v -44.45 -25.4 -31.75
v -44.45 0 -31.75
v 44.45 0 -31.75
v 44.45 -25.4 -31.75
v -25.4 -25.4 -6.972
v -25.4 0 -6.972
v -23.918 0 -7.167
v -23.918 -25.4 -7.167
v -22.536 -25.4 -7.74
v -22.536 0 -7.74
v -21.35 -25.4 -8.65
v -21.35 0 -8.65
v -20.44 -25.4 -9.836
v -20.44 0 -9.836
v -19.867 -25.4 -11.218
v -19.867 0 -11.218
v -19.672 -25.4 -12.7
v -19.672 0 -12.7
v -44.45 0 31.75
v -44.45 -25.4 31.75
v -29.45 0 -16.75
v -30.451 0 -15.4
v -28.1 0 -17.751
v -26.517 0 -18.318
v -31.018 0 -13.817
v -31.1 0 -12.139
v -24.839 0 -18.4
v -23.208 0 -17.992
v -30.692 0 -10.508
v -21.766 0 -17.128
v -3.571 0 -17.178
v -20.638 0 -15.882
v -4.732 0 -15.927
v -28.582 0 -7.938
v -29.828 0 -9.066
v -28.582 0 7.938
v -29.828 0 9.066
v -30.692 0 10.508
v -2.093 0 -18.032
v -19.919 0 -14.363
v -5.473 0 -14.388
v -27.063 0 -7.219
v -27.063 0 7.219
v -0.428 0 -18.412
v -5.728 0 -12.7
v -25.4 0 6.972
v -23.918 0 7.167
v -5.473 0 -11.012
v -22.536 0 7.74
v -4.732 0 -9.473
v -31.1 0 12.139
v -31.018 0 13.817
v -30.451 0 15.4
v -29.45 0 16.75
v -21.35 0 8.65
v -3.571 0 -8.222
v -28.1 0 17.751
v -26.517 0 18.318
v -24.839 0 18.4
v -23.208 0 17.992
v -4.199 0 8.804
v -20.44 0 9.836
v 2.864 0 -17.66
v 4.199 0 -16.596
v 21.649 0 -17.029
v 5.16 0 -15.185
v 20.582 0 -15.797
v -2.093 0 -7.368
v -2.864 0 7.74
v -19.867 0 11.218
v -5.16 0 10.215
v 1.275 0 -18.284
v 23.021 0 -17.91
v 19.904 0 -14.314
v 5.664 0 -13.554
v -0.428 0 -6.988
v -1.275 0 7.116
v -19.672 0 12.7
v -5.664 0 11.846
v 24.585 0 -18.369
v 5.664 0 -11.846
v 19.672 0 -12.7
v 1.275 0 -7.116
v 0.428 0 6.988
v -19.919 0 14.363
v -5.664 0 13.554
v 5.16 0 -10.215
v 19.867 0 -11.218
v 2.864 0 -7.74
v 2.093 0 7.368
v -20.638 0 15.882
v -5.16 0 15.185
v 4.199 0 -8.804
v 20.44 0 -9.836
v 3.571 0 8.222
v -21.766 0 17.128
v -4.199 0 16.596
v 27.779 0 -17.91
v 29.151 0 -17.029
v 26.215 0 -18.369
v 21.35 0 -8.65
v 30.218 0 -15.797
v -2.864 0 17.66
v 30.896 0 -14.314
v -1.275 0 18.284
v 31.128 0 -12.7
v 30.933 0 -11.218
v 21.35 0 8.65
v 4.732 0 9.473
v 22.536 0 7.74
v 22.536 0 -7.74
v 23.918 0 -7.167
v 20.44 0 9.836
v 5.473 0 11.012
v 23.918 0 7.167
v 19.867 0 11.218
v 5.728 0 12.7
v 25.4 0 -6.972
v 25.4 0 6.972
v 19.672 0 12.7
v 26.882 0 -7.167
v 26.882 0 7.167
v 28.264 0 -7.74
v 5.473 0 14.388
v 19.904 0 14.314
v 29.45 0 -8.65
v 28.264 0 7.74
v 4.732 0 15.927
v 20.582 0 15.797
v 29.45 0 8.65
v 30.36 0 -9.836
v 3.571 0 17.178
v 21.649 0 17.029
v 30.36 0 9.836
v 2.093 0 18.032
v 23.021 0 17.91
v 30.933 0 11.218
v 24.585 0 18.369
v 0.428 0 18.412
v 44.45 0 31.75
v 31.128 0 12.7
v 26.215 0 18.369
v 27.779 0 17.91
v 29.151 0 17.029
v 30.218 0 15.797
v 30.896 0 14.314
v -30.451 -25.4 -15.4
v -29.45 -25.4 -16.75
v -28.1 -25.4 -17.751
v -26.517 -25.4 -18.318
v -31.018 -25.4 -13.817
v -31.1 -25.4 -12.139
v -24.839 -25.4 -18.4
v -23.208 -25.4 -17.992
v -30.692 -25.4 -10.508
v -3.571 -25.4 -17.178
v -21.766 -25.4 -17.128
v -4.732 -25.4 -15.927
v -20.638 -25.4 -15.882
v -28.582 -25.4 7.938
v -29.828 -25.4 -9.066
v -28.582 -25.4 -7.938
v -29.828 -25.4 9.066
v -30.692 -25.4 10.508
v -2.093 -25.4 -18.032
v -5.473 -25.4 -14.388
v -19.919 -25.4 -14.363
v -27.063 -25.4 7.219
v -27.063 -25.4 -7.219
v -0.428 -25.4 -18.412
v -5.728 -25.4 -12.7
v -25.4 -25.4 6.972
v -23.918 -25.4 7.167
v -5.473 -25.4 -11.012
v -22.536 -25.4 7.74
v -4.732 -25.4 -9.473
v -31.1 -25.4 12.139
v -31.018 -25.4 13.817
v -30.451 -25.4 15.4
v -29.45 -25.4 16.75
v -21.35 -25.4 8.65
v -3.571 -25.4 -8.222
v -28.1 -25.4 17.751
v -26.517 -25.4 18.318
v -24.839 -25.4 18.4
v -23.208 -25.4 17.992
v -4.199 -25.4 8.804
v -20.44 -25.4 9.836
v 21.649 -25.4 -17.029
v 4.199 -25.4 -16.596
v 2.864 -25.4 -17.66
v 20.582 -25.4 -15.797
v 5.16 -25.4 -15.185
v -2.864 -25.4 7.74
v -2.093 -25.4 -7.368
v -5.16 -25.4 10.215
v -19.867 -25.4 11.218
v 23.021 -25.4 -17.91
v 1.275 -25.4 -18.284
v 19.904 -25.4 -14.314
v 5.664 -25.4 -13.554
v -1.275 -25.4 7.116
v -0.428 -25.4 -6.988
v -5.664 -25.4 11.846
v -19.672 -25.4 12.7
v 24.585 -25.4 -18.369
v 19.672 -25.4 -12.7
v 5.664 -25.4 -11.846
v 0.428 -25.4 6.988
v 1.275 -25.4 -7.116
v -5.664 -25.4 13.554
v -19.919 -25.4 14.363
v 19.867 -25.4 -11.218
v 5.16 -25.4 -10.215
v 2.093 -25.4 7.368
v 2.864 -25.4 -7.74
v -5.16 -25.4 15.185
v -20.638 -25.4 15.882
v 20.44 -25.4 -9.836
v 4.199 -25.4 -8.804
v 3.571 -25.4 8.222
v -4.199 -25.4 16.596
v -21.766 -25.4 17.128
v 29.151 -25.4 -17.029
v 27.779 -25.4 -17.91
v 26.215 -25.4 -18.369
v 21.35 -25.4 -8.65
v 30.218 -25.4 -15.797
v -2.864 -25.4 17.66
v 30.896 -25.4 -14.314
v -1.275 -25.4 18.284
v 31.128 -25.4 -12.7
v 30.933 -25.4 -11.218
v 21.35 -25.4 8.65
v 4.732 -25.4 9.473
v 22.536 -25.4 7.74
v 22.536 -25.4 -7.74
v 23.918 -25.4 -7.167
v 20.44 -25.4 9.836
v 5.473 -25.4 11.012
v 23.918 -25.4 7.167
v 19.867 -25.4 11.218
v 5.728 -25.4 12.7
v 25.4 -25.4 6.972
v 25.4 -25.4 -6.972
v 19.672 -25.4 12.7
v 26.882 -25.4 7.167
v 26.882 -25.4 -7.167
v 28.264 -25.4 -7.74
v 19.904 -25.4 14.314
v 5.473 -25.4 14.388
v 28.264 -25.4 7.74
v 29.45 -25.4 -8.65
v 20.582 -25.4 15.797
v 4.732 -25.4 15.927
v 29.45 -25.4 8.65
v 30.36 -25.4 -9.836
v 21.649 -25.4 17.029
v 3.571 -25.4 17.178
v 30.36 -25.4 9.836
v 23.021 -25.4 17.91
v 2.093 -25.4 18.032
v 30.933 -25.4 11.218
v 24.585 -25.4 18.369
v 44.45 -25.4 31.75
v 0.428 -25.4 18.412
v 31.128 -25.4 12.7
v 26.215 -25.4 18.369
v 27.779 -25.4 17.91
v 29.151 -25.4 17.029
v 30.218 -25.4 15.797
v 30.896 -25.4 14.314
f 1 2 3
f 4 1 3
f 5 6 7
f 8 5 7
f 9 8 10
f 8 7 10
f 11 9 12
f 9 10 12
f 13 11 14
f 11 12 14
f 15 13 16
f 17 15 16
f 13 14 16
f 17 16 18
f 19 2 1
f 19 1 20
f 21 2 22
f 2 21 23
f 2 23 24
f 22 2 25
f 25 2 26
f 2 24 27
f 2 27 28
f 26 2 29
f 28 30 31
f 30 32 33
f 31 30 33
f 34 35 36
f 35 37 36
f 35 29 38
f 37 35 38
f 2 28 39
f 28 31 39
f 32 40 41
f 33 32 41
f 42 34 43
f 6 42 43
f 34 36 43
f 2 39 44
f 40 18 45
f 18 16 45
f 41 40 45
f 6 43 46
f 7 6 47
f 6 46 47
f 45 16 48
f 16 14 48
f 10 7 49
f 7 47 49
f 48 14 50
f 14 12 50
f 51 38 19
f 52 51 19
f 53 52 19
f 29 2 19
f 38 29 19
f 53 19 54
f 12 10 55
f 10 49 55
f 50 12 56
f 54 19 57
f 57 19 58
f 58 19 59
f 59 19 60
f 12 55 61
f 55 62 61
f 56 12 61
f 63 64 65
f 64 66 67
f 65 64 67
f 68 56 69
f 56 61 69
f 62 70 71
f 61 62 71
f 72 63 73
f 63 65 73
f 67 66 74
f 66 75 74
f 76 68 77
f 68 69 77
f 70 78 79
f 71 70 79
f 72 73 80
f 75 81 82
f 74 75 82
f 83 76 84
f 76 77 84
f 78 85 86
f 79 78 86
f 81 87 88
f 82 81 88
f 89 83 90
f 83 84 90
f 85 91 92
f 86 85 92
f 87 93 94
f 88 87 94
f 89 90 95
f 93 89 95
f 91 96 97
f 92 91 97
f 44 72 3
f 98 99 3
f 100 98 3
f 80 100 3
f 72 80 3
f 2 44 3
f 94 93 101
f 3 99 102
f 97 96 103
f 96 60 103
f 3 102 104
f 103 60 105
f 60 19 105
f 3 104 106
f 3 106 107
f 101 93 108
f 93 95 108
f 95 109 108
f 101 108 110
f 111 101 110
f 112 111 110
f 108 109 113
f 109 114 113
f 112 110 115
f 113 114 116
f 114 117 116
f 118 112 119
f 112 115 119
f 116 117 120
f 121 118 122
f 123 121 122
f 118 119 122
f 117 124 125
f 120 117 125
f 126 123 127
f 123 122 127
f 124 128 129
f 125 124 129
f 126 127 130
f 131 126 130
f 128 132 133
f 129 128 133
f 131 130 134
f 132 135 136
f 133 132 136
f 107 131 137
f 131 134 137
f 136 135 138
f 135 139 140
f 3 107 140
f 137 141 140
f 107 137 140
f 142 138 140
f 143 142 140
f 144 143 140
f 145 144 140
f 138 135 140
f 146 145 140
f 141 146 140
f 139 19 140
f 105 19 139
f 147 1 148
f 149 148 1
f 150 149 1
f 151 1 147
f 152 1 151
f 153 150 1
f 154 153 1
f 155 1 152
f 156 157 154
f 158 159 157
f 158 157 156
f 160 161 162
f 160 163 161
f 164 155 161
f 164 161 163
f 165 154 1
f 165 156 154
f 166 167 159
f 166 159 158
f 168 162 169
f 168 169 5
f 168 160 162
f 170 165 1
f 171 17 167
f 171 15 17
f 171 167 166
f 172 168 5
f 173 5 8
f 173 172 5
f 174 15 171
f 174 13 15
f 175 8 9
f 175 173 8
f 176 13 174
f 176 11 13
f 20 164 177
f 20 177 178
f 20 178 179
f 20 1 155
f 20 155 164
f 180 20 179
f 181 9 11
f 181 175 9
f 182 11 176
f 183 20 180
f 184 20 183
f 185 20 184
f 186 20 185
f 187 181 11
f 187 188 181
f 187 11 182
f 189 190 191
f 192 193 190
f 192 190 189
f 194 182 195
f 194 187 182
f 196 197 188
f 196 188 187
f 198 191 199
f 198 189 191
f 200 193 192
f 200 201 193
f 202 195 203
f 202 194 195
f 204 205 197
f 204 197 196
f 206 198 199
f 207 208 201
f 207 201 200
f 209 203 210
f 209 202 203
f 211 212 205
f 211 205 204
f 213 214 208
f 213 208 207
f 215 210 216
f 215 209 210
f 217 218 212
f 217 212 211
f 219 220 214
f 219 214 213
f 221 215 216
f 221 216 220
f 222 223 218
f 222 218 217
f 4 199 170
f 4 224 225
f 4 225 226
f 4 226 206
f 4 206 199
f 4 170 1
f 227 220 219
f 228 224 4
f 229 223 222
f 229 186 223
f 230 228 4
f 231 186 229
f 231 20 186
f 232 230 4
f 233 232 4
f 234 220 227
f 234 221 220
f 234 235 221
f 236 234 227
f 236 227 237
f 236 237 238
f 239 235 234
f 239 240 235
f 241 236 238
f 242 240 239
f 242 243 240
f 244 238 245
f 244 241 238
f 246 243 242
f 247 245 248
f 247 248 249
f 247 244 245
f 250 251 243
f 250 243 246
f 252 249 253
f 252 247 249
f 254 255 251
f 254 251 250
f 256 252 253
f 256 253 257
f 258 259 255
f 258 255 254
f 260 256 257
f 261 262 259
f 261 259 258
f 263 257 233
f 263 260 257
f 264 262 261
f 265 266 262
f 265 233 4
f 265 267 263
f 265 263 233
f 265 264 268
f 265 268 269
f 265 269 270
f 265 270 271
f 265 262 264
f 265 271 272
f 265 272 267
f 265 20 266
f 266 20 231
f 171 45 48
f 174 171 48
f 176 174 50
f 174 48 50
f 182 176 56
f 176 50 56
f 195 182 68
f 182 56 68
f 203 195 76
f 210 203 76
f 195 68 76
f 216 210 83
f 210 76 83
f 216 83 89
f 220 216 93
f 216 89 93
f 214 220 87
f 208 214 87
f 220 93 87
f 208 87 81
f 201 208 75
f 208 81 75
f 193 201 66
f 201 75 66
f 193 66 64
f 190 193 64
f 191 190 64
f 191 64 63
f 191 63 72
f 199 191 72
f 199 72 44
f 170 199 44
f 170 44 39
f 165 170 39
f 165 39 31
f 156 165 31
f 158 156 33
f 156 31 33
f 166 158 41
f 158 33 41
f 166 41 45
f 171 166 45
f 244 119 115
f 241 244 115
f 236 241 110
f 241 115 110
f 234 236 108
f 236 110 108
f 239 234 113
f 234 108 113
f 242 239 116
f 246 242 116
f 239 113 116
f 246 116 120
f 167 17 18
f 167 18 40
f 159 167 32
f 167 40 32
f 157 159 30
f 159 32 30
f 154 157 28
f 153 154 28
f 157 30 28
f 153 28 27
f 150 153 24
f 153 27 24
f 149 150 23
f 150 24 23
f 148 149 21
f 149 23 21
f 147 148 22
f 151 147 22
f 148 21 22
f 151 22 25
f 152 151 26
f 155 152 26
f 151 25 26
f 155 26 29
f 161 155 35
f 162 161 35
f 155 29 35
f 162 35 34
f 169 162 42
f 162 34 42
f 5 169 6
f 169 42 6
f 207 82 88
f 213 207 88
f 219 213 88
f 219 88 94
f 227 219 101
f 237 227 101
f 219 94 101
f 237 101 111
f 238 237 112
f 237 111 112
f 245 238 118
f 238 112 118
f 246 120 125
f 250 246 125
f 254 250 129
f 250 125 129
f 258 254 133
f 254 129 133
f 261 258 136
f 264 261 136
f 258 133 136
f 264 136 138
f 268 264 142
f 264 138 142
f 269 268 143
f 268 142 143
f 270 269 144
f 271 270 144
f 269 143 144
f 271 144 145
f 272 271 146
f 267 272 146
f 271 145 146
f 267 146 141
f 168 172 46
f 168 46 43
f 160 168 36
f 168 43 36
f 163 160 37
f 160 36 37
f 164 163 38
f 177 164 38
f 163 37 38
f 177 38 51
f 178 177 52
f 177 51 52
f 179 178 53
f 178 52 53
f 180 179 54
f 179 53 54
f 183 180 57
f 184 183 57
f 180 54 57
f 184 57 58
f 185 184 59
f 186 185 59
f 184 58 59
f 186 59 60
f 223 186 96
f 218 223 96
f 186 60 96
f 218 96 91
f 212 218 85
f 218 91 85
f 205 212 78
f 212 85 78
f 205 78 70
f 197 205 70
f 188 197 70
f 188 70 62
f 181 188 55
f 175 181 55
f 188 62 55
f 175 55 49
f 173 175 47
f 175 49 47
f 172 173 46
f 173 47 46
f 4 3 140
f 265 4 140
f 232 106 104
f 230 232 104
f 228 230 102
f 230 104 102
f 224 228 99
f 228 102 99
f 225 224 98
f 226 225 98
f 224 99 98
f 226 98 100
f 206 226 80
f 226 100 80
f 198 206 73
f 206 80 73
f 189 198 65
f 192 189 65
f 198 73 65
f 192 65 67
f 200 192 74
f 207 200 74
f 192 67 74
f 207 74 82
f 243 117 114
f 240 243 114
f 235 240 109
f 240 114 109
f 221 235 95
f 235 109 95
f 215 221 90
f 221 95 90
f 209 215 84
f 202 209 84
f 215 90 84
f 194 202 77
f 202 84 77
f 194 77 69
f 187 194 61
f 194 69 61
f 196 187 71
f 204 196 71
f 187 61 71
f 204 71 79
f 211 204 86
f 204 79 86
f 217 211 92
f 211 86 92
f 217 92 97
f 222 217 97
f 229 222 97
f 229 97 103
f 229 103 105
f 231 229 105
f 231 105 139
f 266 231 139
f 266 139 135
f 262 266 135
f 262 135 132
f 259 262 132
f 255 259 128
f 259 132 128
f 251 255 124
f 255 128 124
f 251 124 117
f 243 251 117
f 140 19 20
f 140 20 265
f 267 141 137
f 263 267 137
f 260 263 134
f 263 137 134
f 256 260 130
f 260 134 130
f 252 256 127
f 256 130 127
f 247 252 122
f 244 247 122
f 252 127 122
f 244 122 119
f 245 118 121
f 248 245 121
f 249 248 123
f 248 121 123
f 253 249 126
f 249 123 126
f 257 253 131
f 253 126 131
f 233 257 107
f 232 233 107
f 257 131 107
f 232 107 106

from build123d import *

# Parameters (mm, degrees)
F0_W     = 88.9
F0_H     = 63.5
F1_DEPTH = 25.4


with BuildPart() as f1:
    # F0 (on Front) → F1 (new body)
    with BuildSketch(Plane.XZ):
        Rectangle(F0_W, F0_H)
        with BuildLine():
            ThreePointArc((-25.4, 6.9723), (-29.4500955106, 16.7500955106), (-19.6723, 12.7))
            Line((-19.6723, 12.7), (-5.7277, 12.7))
            ThreePointArc((-5.7277, 12.7), (0, 18.4277), (5.7277, 12.7))
            Line((5.7277, 12.7), (19.6723, 12.7))
            ThreePointArc((19.6723, 12.7), (25.4, 18.4277), (31.1277, 12.7))
            ThreePointArc((31.1277, 12.7), (29.4500955106, 8.6499044894), (25.4, 6.9723))
            Line((25.4, 6.9723), (25.4, -6.9723))
            ThreePointArc((25.4, -6.9723), (29.4500955106, -8.6499044894), (31.1277, -12.7))
            ThreePointArc((31.1277, -12.7), (25.4, -18.4277), (19.6723, -12.7))
            Line((19.6723, -12.7), (5.7277, -12.7))
            ThreePointArc((5.7277, -12.7), (0, -18.4277), (-5.7277, -12.7))
            Line((-5.7277, -12.7), (-19.6723, -12.7))
            ThreePointArc((-19.6723, -12.7), (-29.4500955106, -16.7500955106), (-25.4, -6.9723))
            Line((-25.4, -6.9723), (-25.4, 6.9723))
        make_face(mode=Mode.SUBTRACT)
        with BuildLine():
            Line((-5.7277, 12.7), (-19.6723, 12.7))
            ThreePointArc((-19.6723, 12.7), (-21.3499044894, 8.6499044894), (-25.4, 6.9723))
            Line((-25.4, 6.9723), (-25.4, -6.9723))
            ThreePointArc((-25.4, -6.9723), (-21.3499044894, -8.6499044894), (-19.6723, -12.7))
            Line((-19.6723, -12.7), (-5.7277, -12.7))
            ThreePointArc((-5.7277, -12.7), (0, -6.9723), (5.7277, -12.7))
            Line((5.7277, -12.7), (19.6723, -12.7))
            ThreePointArc((19.6723, -12.7), (21.3499044894, -8.6499044894), (25.4, -6.9723))
            Line((25.4, -6.9723), (25.4, 6.9723))
            ThreePointArc((25.4, 6.9723), (21.3499044894, 8.6499044894), (19.6723, 12.7))
            Line((19.6723, 12.7), (5.7277, 12.7))
            ThreePointArc((5.7277, 12.7), (0, 6.9723), (-5.7277, 12.7))
        make_face()
    extrude(amount=F1_DEPTH)


solid = f1.part
